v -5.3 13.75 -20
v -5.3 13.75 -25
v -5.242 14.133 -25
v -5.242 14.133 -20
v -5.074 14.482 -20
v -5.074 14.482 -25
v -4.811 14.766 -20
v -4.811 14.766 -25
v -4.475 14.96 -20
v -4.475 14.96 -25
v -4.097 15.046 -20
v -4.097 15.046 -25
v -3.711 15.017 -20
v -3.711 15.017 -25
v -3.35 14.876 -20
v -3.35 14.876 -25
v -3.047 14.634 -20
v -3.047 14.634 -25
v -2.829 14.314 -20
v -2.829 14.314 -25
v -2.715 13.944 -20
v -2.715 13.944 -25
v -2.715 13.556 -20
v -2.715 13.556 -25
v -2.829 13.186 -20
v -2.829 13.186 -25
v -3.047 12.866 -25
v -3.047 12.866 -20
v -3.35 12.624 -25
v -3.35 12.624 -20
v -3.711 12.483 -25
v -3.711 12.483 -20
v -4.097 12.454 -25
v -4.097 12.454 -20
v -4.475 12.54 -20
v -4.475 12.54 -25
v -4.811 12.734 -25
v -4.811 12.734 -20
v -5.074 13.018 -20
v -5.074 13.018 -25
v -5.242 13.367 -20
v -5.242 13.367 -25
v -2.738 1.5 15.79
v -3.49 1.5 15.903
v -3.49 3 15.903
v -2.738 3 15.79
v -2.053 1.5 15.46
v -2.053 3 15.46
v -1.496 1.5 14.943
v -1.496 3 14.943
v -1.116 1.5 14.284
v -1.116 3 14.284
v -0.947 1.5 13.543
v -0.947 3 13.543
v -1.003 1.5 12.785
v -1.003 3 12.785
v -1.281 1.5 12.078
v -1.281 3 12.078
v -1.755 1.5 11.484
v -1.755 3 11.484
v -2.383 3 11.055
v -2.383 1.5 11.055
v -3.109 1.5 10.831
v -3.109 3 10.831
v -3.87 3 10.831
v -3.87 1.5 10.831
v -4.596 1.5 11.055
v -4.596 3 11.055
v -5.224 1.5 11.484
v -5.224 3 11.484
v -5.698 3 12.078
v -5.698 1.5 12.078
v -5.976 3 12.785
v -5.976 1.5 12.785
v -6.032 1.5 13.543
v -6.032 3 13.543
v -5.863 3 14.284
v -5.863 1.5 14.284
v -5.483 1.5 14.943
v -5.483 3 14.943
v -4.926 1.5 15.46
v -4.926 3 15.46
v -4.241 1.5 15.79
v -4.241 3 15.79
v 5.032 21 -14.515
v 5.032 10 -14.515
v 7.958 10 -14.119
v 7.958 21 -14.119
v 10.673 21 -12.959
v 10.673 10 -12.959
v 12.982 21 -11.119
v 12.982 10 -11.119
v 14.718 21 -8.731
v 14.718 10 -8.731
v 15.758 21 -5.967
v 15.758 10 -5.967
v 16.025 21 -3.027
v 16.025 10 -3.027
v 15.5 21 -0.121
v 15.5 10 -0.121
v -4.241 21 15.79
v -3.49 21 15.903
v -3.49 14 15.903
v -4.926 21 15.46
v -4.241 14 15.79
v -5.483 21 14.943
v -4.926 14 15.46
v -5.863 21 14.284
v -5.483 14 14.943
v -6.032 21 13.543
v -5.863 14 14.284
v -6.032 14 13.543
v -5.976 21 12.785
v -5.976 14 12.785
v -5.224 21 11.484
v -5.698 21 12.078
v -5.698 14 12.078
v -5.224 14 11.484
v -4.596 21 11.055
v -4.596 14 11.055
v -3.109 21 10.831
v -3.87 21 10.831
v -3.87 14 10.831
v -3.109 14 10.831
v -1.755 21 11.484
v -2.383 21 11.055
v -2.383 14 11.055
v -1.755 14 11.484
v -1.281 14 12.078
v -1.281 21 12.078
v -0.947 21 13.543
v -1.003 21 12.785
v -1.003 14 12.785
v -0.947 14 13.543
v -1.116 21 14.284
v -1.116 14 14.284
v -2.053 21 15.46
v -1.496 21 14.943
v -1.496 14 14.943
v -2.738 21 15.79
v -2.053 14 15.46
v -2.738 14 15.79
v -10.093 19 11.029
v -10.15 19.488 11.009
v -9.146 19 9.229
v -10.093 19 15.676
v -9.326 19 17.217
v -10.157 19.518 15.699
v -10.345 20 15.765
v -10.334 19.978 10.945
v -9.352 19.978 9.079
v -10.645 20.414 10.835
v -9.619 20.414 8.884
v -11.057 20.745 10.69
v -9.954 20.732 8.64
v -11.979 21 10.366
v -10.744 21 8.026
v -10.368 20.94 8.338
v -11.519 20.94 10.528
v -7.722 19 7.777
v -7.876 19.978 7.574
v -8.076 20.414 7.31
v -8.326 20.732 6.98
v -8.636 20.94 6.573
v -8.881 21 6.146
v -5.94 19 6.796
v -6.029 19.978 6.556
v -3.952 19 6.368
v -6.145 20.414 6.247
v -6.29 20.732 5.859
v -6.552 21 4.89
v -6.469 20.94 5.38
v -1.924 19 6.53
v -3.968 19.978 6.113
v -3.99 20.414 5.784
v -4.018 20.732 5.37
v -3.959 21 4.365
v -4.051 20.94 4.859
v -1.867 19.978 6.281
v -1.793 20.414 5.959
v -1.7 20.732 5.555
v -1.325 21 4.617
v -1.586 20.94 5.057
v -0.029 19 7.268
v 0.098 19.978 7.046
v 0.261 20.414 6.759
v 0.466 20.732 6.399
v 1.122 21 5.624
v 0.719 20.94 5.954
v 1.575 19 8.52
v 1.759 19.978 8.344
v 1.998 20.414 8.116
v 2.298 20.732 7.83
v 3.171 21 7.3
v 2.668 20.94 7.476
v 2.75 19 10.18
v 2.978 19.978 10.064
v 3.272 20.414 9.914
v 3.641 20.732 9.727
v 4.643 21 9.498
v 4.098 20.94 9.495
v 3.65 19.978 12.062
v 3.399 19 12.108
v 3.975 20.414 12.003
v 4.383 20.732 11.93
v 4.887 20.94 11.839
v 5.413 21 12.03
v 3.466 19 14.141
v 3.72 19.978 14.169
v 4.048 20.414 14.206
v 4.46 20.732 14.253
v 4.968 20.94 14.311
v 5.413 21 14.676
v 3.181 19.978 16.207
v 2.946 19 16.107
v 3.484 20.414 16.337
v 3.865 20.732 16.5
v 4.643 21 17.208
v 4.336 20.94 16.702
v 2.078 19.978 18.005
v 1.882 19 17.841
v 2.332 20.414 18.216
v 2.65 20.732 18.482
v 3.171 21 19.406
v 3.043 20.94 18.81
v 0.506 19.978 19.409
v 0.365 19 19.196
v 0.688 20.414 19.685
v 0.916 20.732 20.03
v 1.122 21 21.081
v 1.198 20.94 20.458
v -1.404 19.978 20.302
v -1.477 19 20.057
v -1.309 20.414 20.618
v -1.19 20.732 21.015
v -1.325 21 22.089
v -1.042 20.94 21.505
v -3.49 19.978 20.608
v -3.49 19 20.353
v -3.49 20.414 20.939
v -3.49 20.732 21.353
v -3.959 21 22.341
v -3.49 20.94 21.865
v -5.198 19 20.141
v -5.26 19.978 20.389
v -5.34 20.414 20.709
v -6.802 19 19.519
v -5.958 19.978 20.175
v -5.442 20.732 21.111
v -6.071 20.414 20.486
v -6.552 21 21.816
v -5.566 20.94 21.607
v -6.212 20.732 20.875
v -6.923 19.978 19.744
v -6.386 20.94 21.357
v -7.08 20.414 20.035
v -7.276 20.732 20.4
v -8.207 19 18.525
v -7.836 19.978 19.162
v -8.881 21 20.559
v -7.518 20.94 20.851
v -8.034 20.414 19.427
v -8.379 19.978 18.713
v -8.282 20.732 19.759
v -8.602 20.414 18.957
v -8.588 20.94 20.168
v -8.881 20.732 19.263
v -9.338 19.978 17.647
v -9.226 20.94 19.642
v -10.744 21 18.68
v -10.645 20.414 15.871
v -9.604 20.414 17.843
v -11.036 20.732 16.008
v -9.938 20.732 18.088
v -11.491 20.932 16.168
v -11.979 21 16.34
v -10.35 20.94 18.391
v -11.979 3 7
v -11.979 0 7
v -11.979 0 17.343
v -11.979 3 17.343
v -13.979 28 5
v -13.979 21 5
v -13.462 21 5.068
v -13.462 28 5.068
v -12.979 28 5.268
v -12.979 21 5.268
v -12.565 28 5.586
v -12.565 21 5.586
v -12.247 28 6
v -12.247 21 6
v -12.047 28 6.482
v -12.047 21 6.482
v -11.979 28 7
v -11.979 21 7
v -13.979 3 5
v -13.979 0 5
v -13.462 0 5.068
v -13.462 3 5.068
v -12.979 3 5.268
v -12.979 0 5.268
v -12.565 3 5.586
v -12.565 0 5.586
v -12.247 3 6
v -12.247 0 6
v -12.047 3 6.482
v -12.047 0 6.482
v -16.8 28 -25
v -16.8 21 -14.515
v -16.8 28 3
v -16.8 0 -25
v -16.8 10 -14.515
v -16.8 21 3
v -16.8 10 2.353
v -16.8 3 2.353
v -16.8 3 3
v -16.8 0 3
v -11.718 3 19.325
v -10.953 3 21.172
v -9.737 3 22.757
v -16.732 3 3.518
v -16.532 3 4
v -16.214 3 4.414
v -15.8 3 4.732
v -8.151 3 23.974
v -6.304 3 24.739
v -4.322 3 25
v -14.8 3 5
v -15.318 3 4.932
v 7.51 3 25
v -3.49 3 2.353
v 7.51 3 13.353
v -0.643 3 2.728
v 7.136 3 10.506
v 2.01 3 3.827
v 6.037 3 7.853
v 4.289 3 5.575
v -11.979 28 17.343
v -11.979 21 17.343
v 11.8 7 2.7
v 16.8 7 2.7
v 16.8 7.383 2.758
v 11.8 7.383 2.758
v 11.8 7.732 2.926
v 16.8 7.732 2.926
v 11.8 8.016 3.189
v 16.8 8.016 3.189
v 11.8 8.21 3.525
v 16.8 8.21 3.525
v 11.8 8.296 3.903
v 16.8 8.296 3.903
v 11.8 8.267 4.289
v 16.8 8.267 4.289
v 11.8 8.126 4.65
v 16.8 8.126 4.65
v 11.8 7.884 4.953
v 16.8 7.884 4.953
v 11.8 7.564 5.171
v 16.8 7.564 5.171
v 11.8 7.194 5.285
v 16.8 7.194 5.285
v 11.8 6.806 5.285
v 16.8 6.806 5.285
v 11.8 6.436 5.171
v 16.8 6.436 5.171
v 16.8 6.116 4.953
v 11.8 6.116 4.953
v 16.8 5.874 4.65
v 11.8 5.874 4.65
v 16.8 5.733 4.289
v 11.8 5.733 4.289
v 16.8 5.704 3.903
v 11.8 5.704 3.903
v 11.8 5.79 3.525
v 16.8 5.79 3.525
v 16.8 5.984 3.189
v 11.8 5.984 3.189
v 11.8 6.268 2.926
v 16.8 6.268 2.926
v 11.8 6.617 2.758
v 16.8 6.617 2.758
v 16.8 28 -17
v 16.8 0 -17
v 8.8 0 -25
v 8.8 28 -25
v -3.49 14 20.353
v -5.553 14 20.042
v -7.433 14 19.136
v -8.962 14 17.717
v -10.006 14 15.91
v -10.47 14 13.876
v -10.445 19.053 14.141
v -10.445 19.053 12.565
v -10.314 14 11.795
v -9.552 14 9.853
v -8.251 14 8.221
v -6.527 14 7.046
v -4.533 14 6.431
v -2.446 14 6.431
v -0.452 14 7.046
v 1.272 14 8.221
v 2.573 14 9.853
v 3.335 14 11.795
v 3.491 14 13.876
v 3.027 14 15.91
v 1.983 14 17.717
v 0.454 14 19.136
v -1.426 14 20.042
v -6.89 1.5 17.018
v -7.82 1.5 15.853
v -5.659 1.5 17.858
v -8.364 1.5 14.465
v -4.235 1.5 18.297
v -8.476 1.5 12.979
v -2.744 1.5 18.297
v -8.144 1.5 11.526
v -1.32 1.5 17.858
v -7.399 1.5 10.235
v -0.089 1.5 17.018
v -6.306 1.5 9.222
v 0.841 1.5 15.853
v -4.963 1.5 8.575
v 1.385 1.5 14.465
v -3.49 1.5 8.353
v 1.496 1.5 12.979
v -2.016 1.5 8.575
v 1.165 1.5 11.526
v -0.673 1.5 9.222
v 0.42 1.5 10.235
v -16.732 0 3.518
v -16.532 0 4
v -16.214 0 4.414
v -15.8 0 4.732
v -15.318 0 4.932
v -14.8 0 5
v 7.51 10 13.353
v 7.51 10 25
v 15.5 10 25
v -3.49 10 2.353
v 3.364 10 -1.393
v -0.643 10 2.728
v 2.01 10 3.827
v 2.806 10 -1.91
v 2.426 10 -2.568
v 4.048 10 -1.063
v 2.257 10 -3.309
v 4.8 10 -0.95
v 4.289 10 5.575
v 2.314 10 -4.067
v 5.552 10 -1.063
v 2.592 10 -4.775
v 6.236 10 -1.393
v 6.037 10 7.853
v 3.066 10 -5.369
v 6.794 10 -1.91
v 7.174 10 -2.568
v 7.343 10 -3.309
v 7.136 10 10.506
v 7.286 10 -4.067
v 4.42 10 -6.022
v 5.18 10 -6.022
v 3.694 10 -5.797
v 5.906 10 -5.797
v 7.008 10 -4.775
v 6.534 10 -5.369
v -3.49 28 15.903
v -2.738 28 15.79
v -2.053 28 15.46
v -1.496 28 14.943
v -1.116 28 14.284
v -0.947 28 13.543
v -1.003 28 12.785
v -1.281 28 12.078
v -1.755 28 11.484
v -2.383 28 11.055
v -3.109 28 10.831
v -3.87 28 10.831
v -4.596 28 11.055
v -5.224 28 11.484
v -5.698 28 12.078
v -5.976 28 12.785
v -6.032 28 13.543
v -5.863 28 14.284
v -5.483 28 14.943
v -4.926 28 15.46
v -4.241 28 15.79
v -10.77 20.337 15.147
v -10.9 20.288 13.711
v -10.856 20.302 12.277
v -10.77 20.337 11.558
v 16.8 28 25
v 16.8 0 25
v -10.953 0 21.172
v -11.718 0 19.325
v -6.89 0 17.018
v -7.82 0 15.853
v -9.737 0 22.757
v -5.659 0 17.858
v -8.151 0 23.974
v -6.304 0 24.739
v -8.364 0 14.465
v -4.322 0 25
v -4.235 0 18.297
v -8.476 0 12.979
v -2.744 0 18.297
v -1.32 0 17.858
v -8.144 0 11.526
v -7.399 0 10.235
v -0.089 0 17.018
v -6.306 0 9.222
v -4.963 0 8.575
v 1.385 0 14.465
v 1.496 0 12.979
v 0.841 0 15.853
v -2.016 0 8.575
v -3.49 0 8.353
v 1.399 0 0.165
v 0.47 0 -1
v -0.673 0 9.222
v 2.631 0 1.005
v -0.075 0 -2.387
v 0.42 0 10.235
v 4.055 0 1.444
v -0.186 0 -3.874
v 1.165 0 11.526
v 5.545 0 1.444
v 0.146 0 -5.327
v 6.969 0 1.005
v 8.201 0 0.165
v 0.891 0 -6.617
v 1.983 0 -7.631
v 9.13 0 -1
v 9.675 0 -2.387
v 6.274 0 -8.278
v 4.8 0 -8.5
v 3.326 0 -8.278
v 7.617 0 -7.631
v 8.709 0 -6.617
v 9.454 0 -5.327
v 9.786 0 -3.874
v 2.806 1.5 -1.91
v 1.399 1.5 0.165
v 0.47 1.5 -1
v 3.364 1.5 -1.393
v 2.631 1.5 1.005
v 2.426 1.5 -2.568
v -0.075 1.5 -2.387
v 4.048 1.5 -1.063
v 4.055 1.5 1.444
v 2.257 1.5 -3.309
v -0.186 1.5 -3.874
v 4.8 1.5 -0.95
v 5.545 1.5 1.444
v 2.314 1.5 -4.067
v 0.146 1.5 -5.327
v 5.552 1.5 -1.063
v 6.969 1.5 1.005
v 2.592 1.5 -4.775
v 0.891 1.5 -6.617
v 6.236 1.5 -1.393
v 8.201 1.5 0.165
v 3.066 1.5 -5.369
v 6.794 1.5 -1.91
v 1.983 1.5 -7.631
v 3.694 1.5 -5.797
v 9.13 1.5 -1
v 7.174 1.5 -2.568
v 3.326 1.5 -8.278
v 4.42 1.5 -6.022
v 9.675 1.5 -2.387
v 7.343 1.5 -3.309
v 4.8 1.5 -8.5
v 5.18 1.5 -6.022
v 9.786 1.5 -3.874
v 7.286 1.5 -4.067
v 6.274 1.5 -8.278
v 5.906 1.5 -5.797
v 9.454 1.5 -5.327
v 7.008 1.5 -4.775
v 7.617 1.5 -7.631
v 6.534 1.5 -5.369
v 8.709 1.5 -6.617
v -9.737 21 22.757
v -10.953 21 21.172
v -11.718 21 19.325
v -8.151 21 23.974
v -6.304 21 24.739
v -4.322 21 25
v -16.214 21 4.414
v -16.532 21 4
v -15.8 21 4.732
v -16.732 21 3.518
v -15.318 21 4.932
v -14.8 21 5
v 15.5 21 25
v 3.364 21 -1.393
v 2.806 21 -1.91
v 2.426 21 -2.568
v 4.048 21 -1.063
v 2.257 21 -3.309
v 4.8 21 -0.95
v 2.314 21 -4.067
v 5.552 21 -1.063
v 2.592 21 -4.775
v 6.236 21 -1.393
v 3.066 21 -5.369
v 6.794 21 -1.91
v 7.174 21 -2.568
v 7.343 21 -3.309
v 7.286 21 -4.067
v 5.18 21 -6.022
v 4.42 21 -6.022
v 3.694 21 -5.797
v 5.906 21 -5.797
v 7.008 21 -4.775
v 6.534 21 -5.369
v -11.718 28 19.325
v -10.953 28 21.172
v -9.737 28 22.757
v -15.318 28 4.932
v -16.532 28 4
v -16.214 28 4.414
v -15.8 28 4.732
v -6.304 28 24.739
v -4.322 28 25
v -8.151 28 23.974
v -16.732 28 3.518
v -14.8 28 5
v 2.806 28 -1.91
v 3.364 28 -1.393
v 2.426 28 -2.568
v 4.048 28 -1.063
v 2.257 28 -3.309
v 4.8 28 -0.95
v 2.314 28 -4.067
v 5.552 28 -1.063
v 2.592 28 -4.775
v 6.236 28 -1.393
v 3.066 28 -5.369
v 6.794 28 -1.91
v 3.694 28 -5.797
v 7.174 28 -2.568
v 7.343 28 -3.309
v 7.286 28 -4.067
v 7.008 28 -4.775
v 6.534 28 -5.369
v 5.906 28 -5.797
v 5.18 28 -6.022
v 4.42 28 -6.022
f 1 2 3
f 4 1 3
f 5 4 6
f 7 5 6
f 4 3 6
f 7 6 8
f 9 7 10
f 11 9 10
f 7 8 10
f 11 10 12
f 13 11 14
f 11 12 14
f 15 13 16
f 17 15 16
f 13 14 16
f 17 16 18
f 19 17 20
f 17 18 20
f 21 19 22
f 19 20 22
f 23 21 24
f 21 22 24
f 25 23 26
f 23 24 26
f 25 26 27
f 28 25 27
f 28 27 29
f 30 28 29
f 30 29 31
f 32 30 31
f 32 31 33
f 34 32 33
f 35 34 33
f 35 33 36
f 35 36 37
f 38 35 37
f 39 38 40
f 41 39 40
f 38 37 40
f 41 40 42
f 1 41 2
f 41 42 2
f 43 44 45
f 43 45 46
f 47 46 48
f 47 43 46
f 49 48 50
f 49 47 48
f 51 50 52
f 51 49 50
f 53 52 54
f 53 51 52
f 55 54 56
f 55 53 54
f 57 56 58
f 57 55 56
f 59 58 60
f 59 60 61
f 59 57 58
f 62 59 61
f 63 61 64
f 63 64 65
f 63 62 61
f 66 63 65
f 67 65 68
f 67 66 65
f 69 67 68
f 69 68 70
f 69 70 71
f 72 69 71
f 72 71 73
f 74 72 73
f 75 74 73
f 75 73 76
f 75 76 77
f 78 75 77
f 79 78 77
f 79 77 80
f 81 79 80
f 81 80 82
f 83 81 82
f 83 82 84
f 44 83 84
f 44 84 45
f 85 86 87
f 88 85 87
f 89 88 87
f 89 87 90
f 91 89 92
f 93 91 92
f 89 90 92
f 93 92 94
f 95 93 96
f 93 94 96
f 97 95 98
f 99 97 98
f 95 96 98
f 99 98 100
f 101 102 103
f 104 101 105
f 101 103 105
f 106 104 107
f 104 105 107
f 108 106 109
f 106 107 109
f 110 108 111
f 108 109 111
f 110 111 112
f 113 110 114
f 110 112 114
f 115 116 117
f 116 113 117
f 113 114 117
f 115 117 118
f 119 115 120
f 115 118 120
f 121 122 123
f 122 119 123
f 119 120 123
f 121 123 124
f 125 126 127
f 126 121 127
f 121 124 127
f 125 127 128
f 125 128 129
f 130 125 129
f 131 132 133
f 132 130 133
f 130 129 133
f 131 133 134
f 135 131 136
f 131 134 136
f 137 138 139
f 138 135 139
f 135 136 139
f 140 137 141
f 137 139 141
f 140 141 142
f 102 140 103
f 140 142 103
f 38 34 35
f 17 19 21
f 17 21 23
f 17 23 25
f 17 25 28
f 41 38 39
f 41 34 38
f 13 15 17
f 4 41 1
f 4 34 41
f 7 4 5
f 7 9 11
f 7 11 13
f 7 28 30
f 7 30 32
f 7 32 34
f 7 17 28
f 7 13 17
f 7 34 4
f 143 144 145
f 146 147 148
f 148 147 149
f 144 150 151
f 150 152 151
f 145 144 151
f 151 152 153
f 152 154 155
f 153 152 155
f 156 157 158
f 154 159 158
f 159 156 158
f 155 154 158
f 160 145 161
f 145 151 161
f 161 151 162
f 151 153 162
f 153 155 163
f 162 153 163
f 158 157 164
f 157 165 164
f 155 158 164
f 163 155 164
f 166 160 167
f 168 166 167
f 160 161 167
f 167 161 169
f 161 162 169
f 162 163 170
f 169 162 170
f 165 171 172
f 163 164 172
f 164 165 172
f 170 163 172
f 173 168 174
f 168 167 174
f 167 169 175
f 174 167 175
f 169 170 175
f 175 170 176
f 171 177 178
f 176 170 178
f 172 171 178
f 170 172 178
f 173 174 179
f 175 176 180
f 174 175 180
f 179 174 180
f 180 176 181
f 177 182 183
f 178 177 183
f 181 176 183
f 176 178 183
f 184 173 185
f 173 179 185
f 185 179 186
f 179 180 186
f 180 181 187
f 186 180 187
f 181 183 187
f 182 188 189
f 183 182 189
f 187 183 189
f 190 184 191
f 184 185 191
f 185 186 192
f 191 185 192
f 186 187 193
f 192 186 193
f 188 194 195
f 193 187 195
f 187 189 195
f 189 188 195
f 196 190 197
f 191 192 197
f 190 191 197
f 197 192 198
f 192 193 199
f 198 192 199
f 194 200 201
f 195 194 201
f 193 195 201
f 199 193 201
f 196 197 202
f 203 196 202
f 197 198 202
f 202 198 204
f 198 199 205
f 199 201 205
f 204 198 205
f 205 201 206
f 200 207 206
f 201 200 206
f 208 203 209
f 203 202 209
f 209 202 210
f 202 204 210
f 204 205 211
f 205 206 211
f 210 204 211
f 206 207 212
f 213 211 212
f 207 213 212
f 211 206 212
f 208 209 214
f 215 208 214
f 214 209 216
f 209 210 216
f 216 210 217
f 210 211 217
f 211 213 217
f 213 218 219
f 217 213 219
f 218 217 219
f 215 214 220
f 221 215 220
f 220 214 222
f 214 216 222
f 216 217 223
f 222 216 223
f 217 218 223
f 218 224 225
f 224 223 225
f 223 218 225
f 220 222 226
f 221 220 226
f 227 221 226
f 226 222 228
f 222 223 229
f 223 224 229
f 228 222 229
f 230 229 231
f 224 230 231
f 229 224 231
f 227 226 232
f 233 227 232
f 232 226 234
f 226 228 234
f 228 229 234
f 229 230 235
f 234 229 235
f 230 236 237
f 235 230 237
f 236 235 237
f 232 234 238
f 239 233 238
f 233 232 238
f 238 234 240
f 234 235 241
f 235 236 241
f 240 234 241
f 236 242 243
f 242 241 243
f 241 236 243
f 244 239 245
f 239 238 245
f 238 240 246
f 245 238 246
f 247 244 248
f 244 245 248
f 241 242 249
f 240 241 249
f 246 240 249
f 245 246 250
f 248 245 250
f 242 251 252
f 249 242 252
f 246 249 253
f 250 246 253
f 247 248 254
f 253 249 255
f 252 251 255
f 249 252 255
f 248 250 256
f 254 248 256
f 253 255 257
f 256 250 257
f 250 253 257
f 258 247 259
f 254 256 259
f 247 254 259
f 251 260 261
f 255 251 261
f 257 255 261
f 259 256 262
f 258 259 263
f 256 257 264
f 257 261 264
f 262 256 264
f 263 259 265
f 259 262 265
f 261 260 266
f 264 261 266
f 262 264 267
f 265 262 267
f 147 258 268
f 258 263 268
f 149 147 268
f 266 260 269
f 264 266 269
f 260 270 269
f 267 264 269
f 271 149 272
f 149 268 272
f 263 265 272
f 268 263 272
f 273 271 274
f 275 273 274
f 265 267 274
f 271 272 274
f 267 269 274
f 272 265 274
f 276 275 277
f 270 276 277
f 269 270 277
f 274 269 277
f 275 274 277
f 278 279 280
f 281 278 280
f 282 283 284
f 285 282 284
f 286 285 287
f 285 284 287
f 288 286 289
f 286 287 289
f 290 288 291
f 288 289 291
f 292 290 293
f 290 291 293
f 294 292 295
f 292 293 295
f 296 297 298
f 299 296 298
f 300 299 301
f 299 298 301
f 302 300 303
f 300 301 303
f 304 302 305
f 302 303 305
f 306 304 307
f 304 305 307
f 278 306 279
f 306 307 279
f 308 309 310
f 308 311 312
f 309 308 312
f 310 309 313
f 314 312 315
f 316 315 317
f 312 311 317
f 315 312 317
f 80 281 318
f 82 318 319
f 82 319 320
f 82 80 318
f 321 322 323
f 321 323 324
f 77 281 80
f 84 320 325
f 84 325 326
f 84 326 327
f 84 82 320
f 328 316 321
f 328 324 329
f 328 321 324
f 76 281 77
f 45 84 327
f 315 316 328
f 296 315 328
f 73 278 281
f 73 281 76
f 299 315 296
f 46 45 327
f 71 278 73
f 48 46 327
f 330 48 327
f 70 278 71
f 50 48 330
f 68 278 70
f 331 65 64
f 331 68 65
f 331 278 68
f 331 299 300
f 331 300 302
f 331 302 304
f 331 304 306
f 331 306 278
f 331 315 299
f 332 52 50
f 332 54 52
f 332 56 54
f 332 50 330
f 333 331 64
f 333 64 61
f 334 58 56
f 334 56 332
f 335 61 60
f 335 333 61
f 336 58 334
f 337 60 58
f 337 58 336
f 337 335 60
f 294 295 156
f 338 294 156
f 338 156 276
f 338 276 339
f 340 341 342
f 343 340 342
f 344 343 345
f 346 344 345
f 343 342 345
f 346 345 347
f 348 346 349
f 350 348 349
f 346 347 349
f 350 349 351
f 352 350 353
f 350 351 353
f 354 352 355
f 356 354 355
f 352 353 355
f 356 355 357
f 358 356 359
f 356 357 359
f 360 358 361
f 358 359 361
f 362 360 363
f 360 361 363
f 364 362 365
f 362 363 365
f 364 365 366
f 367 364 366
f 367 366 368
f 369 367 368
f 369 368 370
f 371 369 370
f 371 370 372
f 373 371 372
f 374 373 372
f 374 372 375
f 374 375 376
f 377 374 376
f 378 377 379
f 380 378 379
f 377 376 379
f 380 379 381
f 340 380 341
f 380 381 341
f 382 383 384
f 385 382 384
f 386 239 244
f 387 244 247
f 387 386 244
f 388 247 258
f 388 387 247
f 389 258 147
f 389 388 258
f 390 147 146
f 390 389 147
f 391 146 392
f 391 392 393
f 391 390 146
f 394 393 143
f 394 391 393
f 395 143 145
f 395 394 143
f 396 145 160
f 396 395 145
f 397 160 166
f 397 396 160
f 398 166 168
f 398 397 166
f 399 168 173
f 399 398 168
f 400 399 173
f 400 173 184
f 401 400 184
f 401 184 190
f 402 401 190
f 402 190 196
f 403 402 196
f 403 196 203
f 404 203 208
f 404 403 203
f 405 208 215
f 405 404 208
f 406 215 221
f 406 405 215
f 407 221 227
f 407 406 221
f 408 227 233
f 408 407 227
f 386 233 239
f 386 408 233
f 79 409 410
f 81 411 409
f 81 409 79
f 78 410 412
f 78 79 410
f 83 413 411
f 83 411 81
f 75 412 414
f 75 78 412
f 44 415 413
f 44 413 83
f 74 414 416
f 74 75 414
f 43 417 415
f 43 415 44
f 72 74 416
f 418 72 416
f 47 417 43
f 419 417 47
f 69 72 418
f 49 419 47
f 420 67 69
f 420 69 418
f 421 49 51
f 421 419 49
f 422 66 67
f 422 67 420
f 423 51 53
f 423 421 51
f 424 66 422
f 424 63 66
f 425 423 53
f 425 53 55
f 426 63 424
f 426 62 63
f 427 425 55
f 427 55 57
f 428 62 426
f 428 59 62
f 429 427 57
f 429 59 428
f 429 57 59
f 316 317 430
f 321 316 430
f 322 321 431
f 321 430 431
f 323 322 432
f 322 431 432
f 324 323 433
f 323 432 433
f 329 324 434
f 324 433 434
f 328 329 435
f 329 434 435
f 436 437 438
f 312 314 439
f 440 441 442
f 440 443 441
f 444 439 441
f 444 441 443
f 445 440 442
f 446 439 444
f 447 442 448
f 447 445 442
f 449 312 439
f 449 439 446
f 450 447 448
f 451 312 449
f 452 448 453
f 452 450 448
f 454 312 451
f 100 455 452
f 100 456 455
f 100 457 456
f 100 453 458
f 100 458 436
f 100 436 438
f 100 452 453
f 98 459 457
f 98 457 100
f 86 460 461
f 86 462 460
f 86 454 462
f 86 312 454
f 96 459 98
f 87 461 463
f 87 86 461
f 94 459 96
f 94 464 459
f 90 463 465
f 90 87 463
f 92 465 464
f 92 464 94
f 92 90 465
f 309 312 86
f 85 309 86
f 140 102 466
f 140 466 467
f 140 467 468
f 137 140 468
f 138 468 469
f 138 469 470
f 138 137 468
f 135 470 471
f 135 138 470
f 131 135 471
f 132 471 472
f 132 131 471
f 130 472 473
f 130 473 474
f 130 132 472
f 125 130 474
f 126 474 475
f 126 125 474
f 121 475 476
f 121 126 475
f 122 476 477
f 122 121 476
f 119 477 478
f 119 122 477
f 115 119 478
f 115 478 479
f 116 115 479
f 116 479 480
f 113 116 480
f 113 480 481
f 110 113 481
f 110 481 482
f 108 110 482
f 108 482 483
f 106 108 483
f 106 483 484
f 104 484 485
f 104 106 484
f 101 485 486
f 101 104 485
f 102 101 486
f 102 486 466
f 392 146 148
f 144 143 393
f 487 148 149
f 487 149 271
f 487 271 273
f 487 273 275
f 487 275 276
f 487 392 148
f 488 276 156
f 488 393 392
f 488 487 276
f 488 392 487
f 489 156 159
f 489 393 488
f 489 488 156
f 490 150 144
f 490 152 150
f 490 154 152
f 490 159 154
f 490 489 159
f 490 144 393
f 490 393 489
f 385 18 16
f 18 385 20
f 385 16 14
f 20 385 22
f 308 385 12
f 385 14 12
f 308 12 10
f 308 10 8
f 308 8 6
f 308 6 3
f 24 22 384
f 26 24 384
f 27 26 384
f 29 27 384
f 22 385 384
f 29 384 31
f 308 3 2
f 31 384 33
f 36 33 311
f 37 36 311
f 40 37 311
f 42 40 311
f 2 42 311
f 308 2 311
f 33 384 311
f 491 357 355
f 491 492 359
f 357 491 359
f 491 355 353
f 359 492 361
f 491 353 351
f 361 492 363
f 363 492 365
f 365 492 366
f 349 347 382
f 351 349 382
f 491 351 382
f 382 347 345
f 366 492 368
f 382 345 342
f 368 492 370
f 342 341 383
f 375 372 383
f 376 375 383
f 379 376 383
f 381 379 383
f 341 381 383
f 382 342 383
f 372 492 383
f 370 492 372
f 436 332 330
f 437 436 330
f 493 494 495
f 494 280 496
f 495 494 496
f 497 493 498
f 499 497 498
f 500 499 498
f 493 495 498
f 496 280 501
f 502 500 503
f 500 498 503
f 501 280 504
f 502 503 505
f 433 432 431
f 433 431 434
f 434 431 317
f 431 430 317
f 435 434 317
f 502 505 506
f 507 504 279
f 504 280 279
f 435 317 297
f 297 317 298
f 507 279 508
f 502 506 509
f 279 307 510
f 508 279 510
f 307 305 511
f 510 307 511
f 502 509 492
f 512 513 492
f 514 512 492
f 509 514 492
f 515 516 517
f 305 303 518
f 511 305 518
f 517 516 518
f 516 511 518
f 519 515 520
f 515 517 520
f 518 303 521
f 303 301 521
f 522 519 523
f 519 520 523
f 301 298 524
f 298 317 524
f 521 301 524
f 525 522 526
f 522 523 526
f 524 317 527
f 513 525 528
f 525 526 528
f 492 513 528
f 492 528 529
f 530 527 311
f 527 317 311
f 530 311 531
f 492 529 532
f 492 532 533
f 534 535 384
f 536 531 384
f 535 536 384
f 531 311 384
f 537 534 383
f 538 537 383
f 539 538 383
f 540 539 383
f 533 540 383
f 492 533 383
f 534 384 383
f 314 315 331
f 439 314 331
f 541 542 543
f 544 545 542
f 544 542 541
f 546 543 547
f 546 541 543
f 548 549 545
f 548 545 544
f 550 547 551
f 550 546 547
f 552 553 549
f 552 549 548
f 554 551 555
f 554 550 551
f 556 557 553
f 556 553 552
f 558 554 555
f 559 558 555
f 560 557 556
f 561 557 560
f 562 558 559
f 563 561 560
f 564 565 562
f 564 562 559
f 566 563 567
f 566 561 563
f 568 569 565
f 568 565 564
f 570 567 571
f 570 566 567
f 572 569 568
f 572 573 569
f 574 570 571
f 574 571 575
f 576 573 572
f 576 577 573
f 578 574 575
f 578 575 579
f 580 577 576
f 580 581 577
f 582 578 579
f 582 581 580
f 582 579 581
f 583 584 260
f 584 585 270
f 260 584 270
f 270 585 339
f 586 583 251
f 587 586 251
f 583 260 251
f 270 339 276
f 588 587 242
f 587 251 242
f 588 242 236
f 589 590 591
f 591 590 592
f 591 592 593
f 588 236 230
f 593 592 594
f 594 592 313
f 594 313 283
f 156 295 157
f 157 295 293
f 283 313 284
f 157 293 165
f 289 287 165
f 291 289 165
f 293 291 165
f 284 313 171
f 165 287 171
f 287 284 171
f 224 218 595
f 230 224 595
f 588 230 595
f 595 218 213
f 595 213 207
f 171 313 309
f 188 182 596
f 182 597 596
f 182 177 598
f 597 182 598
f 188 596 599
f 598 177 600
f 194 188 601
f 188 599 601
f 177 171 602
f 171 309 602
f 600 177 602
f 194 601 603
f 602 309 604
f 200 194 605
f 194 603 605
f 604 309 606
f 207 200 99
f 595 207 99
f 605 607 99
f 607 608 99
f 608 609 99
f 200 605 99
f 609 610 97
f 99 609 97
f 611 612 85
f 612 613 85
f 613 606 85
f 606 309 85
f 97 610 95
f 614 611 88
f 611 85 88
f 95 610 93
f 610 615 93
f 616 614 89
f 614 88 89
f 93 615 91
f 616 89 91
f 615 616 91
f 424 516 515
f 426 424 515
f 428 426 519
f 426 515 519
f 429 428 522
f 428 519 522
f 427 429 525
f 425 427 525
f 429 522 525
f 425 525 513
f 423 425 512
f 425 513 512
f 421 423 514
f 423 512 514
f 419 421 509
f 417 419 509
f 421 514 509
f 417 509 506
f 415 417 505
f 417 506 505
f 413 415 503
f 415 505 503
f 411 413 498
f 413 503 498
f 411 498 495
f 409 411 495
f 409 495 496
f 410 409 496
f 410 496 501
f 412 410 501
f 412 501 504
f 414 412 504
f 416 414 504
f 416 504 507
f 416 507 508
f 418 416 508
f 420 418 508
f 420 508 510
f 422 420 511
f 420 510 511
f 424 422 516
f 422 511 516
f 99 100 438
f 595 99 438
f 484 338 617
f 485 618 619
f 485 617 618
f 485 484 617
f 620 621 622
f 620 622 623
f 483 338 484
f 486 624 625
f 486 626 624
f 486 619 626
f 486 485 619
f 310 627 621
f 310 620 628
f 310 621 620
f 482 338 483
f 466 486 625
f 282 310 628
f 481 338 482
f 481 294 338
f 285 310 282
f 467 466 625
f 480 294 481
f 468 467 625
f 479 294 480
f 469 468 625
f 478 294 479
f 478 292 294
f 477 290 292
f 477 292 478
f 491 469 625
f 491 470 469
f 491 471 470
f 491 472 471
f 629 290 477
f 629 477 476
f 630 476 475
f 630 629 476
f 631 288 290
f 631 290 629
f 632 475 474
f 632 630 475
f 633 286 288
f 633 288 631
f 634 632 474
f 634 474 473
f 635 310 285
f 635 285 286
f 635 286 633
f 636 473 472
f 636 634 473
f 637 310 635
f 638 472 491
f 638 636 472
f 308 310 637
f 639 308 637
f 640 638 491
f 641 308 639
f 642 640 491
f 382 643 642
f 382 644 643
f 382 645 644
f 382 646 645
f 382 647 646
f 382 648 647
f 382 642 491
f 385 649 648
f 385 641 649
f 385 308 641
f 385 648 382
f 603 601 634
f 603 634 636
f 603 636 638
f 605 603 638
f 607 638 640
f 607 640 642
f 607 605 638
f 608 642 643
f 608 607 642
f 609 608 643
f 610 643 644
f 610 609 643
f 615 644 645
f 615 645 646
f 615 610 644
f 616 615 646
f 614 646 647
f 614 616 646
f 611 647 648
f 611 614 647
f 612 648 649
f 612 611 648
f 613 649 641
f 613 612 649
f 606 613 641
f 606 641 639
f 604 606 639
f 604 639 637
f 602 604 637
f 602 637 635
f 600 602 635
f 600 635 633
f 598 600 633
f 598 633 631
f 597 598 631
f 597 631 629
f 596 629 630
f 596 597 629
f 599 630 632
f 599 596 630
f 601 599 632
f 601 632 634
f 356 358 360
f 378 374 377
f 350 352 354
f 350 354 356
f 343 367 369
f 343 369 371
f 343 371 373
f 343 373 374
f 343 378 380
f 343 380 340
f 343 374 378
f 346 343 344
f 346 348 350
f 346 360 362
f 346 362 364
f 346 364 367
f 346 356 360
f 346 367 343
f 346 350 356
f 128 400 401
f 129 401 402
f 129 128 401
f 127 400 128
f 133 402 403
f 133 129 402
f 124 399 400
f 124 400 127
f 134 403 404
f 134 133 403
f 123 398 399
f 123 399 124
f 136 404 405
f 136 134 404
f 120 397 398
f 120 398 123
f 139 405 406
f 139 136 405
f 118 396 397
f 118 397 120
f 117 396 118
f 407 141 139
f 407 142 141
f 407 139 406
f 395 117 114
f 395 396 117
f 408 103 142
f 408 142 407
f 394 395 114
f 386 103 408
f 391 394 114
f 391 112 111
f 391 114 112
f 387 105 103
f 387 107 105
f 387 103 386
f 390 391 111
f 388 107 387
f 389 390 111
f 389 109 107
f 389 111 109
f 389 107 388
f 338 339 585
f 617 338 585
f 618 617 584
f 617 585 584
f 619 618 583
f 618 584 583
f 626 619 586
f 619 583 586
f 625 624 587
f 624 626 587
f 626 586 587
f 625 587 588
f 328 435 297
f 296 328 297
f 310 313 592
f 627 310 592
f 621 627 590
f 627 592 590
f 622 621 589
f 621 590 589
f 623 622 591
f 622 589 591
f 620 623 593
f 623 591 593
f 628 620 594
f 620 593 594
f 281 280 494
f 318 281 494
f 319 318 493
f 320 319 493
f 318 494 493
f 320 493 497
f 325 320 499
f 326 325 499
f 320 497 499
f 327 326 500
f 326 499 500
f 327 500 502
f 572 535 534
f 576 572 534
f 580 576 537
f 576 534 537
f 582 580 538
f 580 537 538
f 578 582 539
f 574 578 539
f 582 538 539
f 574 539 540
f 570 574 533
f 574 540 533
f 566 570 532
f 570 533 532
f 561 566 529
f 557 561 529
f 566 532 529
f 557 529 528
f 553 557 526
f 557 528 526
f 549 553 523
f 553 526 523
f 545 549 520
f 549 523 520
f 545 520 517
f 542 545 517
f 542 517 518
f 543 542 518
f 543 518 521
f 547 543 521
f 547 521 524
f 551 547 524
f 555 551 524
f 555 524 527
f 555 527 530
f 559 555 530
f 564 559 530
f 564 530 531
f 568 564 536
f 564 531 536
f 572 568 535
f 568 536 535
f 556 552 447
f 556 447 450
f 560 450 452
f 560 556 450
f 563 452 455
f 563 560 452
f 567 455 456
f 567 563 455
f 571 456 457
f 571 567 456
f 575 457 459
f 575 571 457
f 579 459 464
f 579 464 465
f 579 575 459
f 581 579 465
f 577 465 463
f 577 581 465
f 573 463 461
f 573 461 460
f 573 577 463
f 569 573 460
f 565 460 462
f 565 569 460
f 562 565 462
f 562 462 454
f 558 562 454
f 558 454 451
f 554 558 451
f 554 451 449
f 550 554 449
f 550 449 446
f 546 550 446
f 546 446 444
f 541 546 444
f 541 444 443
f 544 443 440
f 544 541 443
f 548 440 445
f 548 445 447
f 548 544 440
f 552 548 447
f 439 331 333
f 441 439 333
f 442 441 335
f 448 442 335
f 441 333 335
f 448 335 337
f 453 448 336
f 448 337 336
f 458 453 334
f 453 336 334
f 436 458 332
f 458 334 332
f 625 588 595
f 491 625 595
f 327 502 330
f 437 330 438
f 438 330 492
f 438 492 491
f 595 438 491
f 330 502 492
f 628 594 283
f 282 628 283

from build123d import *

# Parameters (mm, degrees)
SKETCH_1_R          = 2.55
EXTRUDE_1_DEPTH     = 3
SKETCH_3_R          = 2.55
EXTRUDE_2_DEPTH     = 7
EXTRUDE_3_DEPTH     = 11
SKETCH_5_R          = 2.55
EXTRUDE_4_DEPTH     = 7
EXTRUDE_START       = 7
SKETCH_6_R          = 7
SKETCH_6_R_2        = 2.55
EXTRUDE_5_DEPTH     = 7
SKETCH_7_R          = 1.3
CUT_EXTRUDE_1_DEPTH = 5
SKETCH_8_R          = 1.3
CUT_EXTRUDE_2_DEPTH = 5
SKETCH_9_R          = 5
CUT_EXTRUDE_3_DEPTH = 1.5
CUT_EXTRUDE_4_REACH = 38.718
FILLET_1_R          = 2


with BuildPart() as part:
    # Эскиз1 → Бобышка-Вытянуть1 (new body)
    with BuildSketch(Plane(origin=(0, 0, 0), x_dir=(1, 0, 0), z_dir=(0, 1, 0))):
        with BuildLine():
            Line((8.8, 25), (-16.8, 25))
            Line((-16.8, 25), (-16.8, -3))
            ThreePointArc((-16.8, -3), (-16.214213562, -4.414213562), (-14.8, -5))
            Line((-14.8, -5), (-13.979301231, -5))
            ThreePointArc((-13.979301231, -5), (-12.565087669, -5.585786438), (-11.979301231, -7))
            Line((-11.979301231, -7), (-11.979301231, -17.343145751))
            ThreePointArc((-11.979301231, -17.343145751), (-9.736660544, -22.757359313), (-4.322446982, -25))
            Line((-4.322446982, -25), (16.8, -25))
            Line((16.8, -25), (16.8, 17))
            Line((16.8, 17), (8.8, 25))
        make_face()
        with Locations(Location((4.8, 3.5, 0), (0, 0, 270))):
            Circle(SKETCH_1_R, mode=Mode.SUBTRACT)
        with Locations(Location((-3.489533647, -13.352791034, 0), (0, 0, 270))):
            Circle(SKETCH_1_R, mode=Mode.SUBTRACT)
    extrude(amount=EXTRUDE_1_DEPTH)

    # Эскиз3 → Бобышка-Вытянуть2 (add)
    with BuildSketch(Plane(origin=(0, 3, 0), x_dir=(1, 0, 0), z_dir=(0, 1, 0))):
        with BuildLine():
            Line((8.8, 25), (-16.8, 25))
            Line((-16.8, 25), (-16.8, -2.352791034))
            Line((-16.8, -2.352791034), (-3.489533647, -2.352791034))
            ThreePointArc((-3.489533647, -2.352791034), (4.288640946, -5.574616441), (7.510466353, -13.352791034))
            Line((7.510466353, -13.352791034), (7.510466353, -25))
            Line((7.510466353, -25), (16.8, -25))
            Line((16.8, -25), (16.8, 17))
            Line((16.8, 17), (8.8, 25))
        make_face()
        with Locations(Location((4.8, 3.5, 0), (0, 0, 270))):
            Circle(SKETCH_3_R, mode=Mode.SUBTRACT)
    extrude(amount=EXTRUDE_2_DEPTH)

    # Эскиз4 → Бобышка-Вытянуть3 (add)
    with BuildSketch(Plane(origin=(0, 10, 0), x_dir=(1, 0, 0), z_dir=(0, 1, 0))):
        with BuildLine():
            Line((8.8, 25), (-16.8, 25))
            Line((-16.8, 25), (-16.8, 14.51476677))
            Line((-16.8, 14.51476677), (5.031765415, 14.51476677))
            ThreePointArc((5.031765415, 14.51476677), (13.930610034, 9.983309776), (15.5, 0.121233261))
            Line((15.5, 0.121233261), (15.5, -25))
            Line((15.5, -25), (16.8, -25))
            Line((16.8, -25), (16.8, 17))
            Line((16.8, 17), (8.8, 25))
        make_face()
    extrude(amount=EXTRUDE_3_DEPTH)

    # Эскиз5 → Бобышка-Вытянуть4 (add)
    with BuildSketch(Plane(origin=(0, 21, 0), x_dir=(1, 0, 0), z_dir=(0, 1, 0))):
        with BuildLine():
            Line((8.8, 25), (-16.8, 25))
            Line((-16.8, 25), (-16.8, -3))
            ThreePointArc((-16.8, -3), (-16.214213562, -4.414213562), (-14.8, -5))
            Line((-14.8, -5), (-13.979301231, -5))
            ThreePointArc((-13.979301231, -5), (-12.565087669, -5.585786438), (-11.979301231, -7))
            Line((-11.979301231, -7), (-11.979301231, -23))
            ThreePointArc((-11.979301231, -23), (-11.393514794, -24.414213562), (-9.979301231, -25))
            Line((-9.979301231, -25), (16.8, -25))
            Line((16.8, -25), (16.8, 17))
            Line((16.8, 17), (8.8, 25))
        make_face()
        with Locations(Location((4.8, 3.5, 0), (0, 0, 270))):
            Circle(SKETCH_5_R, mode=Mode.SUBTRACT)
        with Locations(Location((-3.489533647, -13.352791034, 0), (0, 0, 270))):
            Circle(SKETCH_5_R, mode=Mode.SUBTRACT)
    extrude(amount=EXTRUDE_4_DEPTH)

    # Эскиз6 → Бобышка-Вытянуть5 (add)
    with BuildSketch(Plane.XZ.offset(-21).offset(EXTRUDE_START)):
        with Locations(Location((-3.489533647, 13.352791034, 0), (0, 0, 90))):
            Circle(SKETCH_6_R)
        with Locations(Location((-3.489533647, 13.352791034, 0), (0, 0, 90))):
            Circle(SKETCH_6_R_2, mode=Mode.SUBTRACT)
    extrude(amount=-EXTRUDE_5_DEPTH)

    # Эскиз7 → Вырез-Вытянуть1 (cut)
    with BuildSketch(Plane(origin=(0, 0, -25), x_dir=(-1, 0, 0), z_dir=(0, 0, -1))):
        with Locations((4, 13.75)):
            Circle(SKETCH_7_R)
    extrude(amount=-CUT_EXTRUDE_1_DEPTH, mode=Mode.SUBTRACT)

    # Эскиз8 → Вырез-Вытянуть2 (cut)
    with BuildSketch(Plane(origin=(16.8, 0, 0), x_dir=(0, 0, -1), z_dir=(1, 0, 0))):
        with Locations((-4, 7)):
            Circle(SKETCH_8_R)
    extrude(amount=-CUT_EXTRUDE_2_DEPTH, mode=Mode.SUBTRACT)

    # Эскиз9 → Вырез-Вытянуть3 (cut)
    with BuildSketch(Plane.XZ):
        with Locations(Location((-3.489533647, 13.352791034, 0), (0, 0, 270))):
            Circle(SKETCH_9_R)
        with Locations(Location((4.8, -3.5, 0), (0, 0, 270))):
            Circle(SKETCH_9_R)
    extrude(amount=-CUT_EXTRUDE_3_DEPTH, mode=Mode.SUBTRACT)

    # Эскиз10 → Вырез-Вытянуть4 (cut, up to next)
    with BuildSketch(Plane.XZ.offset(-21), mode=Mode.PRIVATE) as cut_extrude_4_sk1:
        with BuildLine():
            Line((-4.322446982, 25), (-11.979301231, 25))
            Line((-11.979301231, 25), (-11.979301231, 17.343145751))
            ThreePointArc((-11.979301231, 17.343145751), (-9.736660544, 22.757359313), (-4.322446982, 25))
        make_face()
    cut_extrude_4_tool1 = extrude(cut_extrude_4_sk1.sketch, amount=-CUT_EXTRUDE_4_REACH, mode=Mode.PRIVATE) & part.part
    add(cut_extrude_4_tool1.solids().sort_by_distance((-10.269005, 21, 23.289704))[0], mode=Mode.SUBTRACT)

    # Скругление1
    fillet_1_edges = [part.edges().sort_by_distance(p)[0] for p in [
        (-3.489533647, 21, 6.352791034),
    ]]
    fillet(fillet_1_edges, radius=FILLET_1_R)


solid = part.part
